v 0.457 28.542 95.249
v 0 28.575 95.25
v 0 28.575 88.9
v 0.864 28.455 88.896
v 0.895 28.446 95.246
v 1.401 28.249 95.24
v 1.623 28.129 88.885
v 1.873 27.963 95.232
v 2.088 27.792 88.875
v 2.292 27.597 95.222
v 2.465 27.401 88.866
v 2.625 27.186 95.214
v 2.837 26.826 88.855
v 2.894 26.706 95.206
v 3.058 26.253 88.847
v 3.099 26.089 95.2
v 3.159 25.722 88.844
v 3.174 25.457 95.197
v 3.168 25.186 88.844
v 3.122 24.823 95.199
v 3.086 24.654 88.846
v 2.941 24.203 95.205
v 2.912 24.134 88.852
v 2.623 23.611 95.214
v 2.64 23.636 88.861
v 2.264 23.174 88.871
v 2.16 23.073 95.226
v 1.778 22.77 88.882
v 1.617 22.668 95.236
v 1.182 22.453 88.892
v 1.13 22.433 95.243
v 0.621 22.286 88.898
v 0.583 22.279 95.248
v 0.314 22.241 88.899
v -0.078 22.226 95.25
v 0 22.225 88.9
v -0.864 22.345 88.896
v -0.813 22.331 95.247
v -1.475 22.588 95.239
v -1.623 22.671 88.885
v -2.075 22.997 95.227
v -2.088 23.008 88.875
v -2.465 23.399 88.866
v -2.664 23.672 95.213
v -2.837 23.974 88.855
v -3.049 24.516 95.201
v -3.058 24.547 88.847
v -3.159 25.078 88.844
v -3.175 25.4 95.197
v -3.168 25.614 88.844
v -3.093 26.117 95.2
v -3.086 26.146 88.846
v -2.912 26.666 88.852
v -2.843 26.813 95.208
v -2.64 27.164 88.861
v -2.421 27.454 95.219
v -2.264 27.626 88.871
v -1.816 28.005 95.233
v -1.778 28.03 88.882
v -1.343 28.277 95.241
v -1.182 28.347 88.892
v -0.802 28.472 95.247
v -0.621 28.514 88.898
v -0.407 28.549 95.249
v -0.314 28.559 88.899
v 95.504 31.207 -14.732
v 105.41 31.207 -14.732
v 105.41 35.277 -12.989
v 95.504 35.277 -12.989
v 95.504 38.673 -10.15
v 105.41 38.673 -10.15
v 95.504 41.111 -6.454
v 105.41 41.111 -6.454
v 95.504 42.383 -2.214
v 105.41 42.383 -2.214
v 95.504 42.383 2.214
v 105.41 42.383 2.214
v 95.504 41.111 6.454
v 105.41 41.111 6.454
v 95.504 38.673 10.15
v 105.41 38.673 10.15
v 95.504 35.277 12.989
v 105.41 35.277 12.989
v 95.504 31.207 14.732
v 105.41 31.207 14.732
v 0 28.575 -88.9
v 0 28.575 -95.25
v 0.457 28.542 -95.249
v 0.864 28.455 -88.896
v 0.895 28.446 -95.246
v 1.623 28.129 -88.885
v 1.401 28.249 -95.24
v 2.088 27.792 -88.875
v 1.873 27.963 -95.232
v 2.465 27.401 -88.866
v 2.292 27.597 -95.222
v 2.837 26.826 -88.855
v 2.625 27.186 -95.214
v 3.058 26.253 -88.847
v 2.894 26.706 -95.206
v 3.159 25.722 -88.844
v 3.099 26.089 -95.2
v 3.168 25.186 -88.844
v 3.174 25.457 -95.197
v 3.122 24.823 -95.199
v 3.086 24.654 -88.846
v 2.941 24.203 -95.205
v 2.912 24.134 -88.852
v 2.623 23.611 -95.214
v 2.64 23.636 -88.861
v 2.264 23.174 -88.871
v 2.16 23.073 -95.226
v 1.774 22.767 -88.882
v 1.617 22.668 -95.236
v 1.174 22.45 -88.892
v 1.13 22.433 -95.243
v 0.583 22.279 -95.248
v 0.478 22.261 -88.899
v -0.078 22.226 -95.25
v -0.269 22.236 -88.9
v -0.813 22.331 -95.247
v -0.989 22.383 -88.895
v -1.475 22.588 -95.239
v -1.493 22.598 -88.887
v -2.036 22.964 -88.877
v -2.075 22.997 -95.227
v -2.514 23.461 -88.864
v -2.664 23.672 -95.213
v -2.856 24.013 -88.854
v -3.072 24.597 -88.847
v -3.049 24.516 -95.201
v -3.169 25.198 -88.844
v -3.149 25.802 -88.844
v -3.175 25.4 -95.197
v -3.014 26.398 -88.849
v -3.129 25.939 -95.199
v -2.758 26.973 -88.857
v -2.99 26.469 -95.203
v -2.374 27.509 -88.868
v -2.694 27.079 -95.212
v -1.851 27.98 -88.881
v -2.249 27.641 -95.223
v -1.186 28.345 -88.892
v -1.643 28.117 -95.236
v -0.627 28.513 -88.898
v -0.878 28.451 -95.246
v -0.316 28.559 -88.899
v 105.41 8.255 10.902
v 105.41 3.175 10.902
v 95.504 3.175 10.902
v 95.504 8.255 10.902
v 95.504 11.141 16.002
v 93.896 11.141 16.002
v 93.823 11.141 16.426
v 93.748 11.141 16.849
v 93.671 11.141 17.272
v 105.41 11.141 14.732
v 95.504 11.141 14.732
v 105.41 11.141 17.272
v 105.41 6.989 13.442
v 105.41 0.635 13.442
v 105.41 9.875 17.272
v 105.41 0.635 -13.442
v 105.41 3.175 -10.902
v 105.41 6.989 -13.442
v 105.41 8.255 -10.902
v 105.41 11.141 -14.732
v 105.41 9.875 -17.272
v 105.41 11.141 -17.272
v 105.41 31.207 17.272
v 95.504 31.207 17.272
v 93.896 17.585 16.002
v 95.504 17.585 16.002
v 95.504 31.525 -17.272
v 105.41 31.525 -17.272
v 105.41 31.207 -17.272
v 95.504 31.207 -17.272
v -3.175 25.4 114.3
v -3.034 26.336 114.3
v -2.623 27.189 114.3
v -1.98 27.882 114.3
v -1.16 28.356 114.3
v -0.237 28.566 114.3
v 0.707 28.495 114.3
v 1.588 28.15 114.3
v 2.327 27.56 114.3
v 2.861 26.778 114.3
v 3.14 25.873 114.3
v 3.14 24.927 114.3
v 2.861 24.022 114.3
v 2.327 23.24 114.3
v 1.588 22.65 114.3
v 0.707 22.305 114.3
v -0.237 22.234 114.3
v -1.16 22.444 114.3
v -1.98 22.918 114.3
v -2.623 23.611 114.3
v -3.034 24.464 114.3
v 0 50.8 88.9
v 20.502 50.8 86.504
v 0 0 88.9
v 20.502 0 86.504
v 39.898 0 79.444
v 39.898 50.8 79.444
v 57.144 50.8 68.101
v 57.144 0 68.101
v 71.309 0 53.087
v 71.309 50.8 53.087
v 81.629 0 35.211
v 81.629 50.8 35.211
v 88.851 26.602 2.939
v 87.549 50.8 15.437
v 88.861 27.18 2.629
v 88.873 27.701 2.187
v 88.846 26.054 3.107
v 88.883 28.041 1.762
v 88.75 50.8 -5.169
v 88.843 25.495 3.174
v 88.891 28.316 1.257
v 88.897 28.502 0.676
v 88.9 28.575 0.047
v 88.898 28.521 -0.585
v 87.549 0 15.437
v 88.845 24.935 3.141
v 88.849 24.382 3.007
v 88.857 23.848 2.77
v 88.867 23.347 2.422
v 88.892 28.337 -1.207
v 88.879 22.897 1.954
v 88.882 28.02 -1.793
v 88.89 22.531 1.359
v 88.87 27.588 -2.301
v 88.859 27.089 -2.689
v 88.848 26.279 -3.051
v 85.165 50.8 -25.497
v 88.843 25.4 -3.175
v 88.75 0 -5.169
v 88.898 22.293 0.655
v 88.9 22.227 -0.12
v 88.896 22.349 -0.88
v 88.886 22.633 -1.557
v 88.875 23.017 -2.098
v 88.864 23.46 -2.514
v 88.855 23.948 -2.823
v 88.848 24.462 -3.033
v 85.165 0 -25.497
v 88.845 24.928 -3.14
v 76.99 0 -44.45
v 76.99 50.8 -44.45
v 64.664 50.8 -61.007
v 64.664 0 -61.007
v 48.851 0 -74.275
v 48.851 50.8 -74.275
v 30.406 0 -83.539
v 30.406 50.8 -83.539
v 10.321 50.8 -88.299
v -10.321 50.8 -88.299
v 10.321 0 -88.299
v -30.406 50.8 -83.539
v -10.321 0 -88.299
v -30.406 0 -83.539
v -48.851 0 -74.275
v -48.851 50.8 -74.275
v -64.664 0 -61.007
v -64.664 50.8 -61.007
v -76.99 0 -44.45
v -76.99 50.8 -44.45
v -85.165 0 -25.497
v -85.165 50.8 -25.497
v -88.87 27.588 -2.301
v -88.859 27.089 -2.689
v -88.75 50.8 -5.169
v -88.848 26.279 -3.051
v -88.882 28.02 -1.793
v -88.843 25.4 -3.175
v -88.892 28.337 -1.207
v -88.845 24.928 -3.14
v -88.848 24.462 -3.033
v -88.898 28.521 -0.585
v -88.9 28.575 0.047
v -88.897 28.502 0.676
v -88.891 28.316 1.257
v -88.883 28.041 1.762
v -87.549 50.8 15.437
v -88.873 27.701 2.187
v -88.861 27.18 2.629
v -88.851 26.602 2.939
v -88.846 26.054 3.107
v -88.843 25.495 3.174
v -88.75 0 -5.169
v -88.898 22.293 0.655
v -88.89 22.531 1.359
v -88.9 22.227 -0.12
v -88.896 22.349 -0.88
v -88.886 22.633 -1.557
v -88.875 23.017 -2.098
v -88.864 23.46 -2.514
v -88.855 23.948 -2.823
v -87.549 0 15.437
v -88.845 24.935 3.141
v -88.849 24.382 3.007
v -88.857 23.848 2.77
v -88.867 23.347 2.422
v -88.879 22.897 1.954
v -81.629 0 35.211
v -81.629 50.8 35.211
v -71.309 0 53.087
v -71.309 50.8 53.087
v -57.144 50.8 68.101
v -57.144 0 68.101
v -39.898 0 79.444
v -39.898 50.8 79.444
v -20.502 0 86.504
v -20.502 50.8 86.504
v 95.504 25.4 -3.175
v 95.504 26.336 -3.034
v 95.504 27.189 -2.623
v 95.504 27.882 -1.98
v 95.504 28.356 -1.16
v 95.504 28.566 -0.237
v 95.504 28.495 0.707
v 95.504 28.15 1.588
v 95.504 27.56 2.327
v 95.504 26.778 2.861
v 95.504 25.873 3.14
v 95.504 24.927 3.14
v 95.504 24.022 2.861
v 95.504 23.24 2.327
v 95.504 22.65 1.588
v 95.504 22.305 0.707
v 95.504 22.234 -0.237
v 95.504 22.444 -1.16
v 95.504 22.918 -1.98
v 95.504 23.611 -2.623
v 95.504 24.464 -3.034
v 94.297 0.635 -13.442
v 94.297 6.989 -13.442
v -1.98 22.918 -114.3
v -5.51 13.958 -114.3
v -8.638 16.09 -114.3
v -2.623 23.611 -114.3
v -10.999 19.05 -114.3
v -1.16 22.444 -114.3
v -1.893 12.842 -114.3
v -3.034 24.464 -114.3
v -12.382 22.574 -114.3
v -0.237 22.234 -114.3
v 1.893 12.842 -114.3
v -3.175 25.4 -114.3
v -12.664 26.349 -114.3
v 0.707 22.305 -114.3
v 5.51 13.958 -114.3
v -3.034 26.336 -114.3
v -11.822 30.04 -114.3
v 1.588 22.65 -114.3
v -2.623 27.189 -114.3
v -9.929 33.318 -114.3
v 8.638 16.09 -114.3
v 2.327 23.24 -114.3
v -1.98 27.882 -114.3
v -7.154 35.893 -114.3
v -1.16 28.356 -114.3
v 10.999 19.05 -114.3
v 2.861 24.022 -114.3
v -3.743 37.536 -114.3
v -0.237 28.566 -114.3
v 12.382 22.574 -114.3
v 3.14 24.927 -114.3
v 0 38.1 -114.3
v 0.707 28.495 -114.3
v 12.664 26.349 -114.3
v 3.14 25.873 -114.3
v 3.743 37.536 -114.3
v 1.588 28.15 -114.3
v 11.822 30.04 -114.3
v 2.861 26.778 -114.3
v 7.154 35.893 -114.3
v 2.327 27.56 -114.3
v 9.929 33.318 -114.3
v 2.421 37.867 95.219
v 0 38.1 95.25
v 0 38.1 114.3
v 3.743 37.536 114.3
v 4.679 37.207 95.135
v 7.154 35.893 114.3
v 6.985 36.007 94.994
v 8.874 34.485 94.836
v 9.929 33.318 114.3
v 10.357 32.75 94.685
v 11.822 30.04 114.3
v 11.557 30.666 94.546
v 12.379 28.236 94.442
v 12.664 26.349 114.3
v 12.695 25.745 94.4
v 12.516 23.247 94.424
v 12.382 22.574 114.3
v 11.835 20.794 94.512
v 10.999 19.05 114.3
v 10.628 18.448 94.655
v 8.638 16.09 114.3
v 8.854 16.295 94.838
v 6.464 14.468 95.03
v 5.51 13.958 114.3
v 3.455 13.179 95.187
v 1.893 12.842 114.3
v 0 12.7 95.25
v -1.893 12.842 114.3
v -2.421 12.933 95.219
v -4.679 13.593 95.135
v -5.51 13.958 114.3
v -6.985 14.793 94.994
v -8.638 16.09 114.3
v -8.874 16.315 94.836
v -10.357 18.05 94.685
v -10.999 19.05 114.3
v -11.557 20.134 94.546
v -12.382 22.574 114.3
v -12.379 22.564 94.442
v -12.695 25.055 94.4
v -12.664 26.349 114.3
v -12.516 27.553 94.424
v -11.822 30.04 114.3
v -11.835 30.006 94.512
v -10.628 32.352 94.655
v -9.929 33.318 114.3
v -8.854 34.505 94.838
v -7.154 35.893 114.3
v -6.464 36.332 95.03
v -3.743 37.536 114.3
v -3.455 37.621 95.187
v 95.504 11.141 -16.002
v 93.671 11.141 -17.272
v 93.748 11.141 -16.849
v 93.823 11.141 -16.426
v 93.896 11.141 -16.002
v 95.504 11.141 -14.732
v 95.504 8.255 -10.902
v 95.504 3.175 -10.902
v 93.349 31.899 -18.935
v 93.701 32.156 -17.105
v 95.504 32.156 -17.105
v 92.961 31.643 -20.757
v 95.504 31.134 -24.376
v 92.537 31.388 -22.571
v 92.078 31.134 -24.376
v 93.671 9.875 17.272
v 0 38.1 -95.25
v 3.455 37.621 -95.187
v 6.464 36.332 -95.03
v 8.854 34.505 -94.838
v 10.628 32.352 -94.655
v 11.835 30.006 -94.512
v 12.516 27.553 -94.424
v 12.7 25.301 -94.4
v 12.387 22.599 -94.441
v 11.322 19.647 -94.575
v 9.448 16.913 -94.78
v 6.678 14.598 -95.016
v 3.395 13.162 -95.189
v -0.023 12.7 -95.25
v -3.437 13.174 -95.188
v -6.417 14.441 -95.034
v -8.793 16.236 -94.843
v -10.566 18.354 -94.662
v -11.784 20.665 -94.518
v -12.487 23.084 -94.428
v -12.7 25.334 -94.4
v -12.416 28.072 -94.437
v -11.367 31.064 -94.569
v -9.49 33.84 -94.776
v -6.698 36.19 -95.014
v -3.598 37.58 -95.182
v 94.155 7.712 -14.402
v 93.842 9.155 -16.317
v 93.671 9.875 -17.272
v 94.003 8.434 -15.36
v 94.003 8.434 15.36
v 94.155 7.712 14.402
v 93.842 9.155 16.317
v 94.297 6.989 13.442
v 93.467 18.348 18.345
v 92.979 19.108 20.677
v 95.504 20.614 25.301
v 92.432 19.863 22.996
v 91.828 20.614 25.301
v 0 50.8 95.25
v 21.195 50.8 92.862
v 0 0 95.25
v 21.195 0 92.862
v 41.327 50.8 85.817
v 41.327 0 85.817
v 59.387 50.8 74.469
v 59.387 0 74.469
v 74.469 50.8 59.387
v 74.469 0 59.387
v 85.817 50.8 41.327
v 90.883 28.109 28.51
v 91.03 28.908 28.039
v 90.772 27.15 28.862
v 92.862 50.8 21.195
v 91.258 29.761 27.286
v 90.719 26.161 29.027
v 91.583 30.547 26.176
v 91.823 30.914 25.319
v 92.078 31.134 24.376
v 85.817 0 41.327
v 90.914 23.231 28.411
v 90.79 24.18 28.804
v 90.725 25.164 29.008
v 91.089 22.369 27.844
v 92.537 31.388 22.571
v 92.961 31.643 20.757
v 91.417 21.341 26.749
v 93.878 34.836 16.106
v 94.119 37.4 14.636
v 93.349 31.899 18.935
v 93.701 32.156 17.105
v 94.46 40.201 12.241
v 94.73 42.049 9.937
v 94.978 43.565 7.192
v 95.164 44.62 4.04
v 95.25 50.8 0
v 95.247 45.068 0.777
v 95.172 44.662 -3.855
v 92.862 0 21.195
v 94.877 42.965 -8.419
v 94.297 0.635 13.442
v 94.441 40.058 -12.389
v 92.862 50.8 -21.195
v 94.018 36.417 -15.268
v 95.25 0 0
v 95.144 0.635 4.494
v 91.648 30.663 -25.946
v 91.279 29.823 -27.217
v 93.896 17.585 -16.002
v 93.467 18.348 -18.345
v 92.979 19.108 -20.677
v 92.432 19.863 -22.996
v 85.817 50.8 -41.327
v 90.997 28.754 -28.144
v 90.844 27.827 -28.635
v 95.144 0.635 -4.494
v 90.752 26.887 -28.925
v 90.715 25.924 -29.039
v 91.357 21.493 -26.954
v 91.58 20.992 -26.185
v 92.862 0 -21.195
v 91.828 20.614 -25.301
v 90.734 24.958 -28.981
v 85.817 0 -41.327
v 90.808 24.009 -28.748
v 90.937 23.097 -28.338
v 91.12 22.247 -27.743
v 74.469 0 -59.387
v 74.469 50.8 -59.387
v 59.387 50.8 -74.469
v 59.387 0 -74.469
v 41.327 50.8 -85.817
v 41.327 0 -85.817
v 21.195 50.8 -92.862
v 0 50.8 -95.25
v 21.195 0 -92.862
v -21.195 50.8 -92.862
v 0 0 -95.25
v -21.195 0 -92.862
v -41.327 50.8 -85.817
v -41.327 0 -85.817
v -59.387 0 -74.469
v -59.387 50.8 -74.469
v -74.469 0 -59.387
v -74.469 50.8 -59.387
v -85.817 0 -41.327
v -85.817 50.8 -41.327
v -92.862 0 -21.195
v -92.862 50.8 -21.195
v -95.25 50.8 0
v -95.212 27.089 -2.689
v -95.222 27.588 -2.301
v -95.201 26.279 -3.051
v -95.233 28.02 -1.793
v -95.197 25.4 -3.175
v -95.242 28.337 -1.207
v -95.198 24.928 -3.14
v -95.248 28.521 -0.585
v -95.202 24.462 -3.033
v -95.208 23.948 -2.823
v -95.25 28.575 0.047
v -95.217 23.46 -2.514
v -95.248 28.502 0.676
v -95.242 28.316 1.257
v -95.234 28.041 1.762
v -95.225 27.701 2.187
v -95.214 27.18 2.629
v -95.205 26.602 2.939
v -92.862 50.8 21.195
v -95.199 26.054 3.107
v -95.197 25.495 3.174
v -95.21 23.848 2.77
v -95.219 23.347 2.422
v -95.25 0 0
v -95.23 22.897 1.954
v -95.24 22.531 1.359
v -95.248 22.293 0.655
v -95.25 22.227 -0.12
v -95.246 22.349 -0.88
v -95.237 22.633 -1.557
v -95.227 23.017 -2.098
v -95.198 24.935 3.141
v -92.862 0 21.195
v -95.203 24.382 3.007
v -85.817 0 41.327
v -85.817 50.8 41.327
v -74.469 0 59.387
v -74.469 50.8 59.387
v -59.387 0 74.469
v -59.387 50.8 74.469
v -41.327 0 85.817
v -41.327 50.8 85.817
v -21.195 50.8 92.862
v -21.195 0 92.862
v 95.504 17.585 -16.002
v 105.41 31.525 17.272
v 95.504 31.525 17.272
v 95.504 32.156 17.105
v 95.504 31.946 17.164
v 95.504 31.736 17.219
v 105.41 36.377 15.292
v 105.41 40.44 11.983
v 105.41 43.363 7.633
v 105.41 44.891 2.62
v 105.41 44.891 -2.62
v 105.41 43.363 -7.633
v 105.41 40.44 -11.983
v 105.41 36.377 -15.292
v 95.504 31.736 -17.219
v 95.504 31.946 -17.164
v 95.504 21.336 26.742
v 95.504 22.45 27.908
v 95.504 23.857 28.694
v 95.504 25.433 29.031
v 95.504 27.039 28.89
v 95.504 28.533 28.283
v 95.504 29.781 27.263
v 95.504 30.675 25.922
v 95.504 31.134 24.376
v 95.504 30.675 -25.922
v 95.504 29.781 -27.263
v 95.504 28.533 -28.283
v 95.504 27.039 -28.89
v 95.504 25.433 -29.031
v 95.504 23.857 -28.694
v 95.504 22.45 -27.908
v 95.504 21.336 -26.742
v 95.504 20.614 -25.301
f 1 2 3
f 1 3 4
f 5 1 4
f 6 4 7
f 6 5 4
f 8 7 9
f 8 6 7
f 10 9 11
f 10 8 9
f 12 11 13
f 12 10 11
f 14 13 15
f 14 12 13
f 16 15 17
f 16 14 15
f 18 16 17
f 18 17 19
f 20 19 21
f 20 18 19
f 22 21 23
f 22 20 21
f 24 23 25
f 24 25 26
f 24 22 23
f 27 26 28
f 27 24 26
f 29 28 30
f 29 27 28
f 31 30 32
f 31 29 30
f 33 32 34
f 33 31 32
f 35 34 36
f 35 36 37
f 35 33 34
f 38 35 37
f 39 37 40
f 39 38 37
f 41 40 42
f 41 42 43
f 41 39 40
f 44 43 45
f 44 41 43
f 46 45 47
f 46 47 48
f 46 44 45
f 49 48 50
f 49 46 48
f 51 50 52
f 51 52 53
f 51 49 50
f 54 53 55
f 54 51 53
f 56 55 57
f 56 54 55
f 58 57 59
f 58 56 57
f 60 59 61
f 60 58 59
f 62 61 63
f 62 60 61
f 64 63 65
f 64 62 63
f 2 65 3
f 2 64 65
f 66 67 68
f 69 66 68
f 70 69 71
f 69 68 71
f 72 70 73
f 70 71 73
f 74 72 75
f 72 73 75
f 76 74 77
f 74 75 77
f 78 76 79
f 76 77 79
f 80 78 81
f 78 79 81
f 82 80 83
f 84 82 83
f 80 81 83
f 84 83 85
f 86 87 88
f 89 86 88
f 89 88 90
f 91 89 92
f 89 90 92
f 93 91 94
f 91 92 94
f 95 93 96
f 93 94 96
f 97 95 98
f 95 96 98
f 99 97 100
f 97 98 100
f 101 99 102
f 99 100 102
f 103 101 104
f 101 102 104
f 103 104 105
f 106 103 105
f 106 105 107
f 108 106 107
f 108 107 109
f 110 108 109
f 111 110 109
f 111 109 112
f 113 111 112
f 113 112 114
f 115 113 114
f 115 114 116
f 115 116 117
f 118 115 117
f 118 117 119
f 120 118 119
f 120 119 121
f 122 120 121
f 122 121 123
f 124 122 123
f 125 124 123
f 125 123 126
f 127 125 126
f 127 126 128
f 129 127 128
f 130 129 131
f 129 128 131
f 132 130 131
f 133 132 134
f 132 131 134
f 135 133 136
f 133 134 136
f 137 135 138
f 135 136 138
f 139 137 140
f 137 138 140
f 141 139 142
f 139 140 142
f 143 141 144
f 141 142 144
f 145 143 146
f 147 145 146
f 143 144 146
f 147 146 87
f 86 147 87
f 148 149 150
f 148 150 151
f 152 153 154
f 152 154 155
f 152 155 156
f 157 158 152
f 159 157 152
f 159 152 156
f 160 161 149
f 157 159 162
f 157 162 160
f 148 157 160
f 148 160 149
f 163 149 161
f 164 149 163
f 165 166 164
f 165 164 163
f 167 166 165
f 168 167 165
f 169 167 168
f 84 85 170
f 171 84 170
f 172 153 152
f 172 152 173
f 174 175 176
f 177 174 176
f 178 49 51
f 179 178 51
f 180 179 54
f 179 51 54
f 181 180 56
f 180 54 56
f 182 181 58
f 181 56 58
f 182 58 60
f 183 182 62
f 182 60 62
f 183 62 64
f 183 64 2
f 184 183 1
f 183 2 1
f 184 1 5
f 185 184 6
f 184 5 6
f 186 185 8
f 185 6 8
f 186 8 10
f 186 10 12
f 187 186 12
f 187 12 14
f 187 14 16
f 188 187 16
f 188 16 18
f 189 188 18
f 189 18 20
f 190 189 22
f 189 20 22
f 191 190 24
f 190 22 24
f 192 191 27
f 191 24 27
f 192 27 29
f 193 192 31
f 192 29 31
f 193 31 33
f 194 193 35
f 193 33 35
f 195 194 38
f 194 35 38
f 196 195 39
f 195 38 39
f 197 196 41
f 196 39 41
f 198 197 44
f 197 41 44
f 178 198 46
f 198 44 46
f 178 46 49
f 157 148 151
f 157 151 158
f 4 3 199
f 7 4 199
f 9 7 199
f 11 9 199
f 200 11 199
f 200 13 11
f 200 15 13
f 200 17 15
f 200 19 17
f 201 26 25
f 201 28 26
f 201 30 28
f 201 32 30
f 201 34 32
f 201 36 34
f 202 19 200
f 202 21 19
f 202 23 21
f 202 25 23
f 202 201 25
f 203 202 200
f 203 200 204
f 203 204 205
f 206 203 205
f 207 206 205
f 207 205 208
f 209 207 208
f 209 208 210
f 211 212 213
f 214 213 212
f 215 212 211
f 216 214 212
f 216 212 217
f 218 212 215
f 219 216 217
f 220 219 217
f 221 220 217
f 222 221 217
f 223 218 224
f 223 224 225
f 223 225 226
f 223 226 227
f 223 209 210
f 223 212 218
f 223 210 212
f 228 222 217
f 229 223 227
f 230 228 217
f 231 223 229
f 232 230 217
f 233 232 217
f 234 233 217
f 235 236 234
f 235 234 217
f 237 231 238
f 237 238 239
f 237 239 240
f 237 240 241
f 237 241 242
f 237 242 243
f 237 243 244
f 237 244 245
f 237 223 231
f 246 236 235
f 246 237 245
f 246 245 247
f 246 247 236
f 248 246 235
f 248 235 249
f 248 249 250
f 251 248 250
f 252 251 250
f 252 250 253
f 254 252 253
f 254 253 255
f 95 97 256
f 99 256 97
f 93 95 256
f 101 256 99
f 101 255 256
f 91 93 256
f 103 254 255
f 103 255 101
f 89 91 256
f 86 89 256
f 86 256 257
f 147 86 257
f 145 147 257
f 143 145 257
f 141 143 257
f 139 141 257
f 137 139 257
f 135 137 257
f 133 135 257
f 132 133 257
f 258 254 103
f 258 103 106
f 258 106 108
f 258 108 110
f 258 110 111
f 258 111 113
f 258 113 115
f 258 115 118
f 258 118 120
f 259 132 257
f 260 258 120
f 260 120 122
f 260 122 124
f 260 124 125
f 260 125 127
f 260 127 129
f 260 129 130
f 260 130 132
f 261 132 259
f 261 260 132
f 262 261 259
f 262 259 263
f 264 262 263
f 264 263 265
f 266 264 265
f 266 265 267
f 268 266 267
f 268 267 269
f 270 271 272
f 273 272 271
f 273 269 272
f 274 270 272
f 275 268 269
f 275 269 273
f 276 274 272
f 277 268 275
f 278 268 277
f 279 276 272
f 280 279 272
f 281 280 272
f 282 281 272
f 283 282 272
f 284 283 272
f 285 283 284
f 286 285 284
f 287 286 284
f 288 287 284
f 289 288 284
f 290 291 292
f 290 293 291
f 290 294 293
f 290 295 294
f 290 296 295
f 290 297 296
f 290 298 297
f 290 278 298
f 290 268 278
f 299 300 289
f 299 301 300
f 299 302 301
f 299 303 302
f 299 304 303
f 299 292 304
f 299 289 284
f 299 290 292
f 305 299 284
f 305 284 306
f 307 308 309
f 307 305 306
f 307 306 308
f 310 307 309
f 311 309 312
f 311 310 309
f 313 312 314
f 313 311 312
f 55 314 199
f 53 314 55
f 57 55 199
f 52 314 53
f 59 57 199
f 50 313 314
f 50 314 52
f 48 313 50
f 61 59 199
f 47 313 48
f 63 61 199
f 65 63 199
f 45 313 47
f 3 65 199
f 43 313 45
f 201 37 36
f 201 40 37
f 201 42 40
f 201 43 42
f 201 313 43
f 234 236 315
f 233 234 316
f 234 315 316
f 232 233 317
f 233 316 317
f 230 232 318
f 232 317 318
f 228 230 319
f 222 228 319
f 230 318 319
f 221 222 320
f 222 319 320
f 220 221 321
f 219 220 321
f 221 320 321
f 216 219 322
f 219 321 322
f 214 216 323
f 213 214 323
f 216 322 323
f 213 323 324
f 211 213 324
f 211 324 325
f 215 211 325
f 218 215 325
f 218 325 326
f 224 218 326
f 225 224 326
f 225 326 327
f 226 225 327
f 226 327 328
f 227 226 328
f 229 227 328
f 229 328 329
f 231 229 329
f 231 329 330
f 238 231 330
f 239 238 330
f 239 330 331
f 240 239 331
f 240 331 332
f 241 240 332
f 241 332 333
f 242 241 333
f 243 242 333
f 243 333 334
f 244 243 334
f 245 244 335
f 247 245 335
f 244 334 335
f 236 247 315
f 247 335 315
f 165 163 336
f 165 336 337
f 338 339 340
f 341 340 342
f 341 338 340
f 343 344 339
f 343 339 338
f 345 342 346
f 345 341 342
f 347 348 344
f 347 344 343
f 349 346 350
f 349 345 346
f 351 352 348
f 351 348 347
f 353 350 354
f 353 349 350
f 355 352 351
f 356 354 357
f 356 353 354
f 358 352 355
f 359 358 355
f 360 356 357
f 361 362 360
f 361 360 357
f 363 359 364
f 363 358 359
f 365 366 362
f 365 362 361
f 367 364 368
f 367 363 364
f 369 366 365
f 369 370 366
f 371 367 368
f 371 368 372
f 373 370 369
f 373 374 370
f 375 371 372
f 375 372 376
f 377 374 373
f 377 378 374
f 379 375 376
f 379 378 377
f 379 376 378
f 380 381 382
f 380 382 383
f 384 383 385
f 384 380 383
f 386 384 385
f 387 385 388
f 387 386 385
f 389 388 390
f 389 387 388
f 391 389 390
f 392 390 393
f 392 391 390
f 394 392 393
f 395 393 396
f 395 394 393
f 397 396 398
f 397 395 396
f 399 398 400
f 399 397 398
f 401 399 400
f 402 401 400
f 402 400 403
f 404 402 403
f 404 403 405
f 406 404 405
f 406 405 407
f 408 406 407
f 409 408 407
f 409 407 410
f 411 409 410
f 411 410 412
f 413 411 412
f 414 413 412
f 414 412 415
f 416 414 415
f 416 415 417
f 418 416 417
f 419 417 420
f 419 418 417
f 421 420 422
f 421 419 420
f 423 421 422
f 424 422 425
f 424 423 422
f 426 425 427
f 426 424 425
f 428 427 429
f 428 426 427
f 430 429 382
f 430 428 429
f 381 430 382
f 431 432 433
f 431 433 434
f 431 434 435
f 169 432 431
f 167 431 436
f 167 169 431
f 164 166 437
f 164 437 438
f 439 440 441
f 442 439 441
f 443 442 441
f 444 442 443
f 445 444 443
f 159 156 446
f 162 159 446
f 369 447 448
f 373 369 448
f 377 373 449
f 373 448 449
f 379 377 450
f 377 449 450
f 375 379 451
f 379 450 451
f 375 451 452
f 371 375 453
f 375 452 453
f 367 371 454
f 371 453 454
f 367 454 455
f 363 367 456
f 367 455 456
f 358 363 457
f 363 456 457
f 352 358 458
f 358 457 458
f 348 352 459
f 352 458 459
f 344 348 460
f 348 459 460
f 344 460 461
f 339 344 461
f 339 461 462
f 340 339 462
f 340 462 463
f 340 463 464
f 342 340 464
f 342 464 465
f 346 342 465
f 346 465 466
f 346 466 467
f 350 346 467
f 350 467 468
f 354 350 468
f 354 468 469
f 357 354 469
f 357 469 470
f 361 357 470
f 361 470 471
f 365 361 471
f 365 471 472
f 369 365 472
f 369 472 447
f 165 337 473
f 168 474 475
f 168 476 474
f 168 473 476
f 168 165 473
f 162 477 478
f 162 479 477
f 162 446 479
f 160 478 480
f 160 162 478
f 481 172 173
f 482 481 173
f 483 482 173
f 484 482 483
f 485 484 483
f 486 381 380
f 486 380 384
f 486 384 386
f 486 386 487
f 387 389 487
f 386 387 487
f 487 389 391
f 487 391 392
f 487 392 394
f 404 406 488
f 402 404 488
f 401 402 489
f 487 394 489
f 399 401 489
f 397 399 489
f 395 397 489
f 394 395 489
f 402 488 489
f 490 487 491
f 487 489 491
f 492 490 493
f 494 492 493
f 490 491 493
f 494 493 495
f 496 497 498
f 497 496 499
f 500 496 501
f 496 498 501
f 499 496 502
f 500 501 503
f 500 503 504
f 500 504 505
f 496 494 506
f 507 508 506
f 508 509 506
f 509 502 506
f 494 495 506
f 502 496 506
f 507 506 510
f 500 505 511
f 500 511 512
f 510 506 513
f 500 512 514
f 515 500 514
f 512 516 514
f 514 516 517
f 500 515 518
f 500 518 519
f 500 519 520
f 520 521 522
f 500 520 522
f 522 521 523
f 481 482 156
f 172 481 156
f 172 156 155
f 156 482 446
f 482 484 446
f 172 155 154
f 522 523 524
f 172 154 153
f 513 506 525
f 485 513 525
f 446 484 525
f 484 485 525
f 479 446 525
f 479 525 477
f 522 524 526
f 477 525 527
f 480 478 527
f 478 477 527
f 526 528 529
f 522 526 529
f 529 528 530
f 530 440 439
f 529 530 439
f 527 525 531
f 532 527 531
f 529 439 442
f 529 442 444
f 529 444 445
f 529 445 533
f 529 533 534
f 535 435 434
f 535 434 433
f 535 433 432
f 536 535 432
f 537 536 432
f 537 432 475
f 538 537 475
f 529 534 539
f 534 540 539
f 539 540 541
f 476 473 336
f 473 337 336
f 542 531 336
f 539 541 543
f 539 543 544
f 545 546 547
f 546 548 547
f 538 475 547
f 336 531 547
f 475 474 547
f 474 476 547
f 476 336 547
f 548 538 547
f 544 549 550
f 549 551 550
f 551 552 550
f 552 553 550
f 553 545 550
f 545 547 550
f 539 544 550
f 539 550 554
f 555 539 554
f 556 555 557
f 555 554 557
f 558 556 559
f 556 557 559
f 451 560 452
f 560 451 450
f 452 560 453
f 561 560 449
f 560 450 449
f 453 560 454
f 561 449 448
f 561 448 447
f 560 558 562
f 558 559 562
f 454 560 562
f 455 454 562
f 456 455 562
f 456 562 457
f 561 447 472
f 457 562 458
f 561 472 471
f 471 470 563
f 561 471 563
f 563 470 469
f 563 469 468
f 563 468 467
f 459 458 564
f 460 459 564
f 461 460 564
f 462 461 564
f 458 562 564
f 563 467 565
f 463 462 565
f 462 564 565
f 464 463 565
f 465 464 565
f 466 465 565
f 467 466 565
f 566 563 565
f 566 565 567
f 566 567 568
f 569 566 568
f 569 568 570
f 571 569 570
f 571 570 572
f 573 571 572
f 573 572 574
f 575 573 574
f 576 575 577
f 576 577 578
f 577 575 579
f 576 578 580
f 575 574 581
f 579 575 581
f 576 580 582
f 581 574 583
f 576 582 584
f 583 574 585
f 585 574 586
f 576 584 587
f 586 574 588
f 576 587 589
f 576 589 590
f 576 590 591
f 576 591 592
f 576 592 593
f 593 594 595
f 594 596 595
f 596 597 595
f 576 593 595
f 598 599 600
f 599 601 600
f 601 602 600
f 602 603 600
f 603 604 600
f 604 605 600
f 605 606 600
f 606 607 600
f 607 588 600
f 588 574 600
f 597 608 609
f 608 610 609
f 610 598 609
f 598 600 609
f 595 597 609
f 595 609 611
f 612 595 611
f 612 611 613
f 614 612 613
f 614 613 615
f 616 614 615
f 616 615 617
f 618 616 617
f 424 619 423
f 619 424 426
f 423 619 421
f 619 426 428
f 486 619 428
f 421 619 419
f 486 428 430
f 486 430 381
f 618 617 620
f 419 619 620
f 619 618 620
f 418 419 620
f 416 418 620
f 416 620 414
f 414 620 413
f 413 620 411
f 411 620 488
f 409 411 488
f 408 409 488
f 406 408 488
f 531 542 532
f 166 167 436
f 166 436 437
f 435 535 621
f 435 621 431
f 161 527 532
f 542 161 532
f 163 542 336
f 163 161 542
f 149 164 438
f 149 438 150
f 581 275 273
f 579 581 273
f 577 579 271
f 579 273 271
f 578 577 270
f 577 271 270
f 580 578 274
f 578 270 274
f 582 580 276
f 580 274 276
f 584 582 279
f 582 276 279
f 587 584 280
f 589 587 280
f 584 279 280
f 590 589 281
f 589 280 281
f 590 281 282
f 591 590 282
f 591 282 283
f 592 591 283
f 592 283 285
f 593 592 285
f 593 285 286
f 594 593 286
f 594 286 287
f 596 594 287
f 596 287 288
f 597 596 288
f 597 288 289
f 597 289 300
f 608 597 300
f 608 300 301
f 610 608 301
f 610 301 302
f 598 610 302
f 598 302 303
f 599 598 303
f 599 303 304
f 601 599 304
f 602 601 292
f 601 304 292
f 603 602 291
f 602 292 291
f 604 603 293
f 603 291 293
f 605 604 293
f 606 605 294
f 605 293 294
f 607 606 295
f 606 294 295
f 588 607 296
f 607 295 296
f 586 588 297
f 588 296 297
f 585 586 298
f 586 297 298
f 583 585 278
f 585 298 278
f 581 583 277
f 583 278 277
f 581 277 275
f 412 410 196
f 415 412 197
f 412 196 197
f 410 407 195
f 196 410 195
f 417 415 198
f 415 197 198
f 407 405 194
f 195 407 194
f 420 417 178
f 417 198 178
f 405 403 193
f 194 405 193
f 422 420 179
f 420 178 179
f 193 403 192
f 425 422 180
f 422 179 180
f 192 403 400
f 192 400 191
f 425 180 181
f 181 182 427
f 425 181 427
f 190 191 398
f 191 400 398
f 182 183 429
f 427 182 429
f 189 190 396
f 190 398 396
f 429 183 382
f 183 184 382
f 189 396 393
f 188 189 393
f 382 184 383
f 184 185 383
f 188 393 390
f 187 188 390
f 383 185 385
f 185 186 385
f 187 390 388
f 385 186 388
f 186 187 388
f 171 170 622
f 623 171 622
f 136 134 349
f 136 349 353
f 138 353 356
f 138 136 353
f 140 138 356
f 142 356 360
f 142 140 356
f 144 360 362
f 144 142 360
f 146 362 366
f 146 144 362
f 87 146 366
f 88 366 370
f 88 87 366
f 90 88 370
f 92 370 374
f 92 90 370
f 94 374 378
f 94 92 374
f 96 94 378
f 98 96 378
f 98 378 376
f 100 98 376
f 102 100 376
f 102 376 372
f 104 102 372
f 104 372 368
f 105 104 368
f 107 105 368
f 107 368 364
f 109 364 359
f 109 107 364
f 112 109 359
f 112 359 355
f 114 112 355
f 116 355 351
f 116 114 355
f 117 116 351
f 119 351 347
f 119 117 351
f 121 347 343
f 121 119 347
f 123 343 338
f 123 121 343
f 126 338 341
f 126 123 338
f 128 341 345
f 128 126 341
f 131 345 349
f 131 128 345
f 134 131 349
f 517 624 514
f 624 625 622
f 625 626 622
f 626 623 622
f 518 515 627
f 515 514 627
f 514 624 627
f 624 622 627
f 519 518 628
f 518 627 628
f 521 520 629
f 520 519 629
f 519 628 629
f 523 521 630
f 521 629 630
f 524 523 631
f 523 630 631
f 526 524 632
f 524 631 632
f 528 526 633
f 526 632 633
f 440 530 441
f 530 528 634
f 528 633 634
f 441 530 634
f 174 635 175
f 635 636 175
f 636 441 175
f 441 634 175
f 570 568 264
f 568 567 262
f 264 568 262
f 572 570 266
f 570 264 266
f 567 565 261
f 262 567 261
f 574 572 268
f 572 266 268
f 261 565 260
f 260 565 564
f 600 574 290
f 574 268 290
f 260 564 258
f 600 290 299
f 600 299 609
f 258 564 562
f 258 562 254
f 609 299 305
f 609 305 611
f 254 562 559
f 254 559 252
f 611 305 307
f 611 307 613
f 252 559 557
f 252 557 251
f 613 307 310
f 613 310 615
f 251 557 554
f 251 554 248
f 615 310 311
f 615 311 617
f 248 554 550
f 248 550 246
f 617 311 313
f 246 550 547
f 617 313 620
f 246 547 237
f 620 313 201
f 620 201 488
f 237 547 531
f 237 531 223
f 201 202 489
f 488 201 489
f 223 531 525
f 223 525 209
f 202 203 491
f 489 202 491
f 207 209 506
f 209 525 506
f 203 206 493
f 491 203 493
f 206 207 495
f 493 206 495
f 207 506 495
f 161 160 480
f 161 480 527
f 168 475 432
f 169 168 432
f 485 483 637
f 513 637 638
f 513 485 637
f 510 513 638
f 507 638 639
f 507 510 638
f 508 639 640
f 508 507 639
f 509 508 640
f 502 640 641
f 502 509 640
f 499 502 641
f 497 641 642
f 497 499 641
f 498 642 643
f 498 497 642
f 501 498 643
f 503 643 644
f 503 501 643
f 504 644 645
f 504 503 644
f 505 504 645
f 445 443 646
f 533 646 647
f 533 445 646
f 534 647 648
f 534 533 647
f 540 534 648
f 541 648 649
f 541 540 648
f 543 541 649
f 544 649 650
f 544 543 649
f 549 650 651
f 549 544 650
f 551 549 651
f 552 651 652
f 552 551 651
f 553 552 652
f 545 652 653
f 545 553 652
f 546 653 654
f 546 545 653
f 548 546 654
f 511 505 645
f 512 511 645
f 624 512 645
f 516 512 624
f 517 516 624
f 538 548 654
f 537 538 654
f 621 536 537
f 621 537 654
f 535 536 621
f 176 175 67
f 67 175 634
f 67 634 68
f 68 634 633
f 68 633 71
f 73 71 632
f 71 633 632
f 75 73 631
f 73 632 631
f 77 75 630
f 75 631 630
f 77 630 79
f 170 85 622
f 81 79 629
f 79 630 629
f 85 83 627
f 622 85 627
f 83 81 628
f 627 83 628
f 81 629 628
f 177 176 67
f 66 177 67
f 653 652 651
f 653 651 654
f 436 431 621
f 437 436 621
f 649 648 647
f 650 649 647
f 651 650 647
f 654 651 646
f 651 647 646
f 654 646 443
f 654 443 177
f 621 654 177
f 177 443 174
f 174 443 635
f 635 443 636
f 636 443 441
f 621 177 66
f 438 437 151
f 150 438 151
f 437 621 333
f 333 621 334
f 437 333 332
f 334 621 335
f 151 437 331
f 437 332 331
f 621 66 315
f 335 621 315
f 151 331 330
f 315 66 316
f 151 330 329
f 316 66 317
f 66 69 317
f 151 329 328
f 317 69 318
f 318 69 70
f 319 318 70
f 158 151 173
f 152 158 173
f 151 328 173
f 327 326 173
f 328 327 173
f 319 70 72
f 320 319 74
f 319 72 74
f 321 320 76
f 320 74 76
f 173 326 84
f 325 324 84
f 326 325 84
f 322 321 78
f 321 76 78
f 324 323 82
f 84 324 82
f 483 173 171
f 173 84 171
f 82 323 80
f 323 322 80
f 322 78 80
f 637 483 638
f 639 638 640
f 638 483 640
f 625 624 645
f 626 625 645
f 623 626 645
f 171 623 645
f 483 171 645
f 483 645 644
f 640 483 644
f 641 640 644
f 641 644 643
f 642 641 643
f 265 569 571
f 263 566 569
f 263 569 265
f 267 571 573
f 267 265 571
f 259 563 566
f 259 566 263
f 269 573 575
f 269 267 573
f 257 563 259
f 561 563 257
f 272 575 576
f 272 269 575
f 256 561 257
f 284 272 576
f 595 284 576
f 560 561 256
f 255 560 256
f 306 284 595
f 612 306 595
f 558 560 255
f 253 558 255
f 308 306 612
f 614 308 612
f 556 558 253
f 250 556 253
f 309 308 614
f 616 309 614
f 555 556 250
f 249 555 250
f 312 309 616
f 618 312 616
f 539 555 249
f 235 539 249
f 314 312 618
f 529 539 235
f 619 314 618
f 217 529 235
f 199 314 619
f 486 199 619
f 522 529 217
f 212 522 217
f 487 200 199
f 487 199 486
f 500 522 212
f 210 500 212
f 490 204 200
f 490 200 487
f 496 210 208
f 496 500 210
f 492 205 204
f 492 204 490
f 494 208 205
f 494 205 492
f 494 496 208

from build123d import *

# Parameters (mm, degrees)
SKETCH1_R                            = 95.25
SKETCH1_R_2                          = 88.9
BOSS_EXTRUDE1_DEPTH                  = 50.8
SKETCH4_R                            = 3.175
CUT_EXTRUDE2_DEPTH                   = 10.16
BOSS_EXTRUDE3_DEPTH                  = 10.16
BOSS_EXTRUDE3_DIRECTION_2_REACH      = 220.96
BOSS_EXTRUDE3_DIRECTION_2_END_RADIUS = 95.25
BOSS_EXTRUDE9_REACH                  = 220.96
BOSS_EXTRUDE9_END_RADIUS             = 95.25
BOSS_EXTRUDE9_DIRECTION_2_DEPTH      = 0.254
SKETCH7_R                            = 3.175
CUT_EXTRUDE3_DEPTH                   = 220.180955111
BOSS_EXTRUDE10_START                 = -0.850464
SKETCH8_R                            = 12.7
SKETCH8_R_2                          = 3.175
BOSS_EXTRUDE10_DEPTH                 = 19.900464


with BuildPart() as part:
    # Sketch1 → Boss-Extrude1 (new body)
    with BuildSketch(Plane(origin=(0, 0, 0), x_dir=(1, 0, 0), z_dir=(0, 1, 0))):
        with Locations(Location((0, 0, 0), (0, 0, 270))):
            Circle(SKETCH1_R)
        with Locations(Location((0, 0, 0), (0, 0, 270))):
            Circle(SKETCH1_R_2, mode=Mode.SUBTRACT)
    extrude(amount=BOSS_EXTRUDE1_DEPTH)

    # Sketch4 → Cut-Extrude2 (cut)
    with BuildSketch(Plane(origin=(0, 0, -95.25), x_dir=(-1, 0, 0), z_dir=(0, 0, -1))):
        with Locations(Location((0, 25.4, 0), (0, 0, 90))):
            Circle(SKETCH4_R)
    cut_extrude2 = extrude(amount=-CUT_EXTRUDE2_DEPTH, mode=Mode.SUBTRACT)

    # Mirror2: Cut-Extrude2 across plane
    add(cut_extrude2.mirror(Plane.XY), mode=Mode.SUBTRACT)

    # Sketch5 → Boss-Extrude3 (add)
    with BuildSketch(Plane(origin=(95.25, 0, 0), x_dir=(0, 0, -1), z_dir=(1, 0, 0))):
        Polygon((14.732, 11.14102204), (10.902119397, 8.255), (10.902119397, 3.175), (-10.902119397, 3.175), (-10.902119397, 8.255), (-14.732, 11.14102204), (-17.272, 11.14102204), (-17.272, 9.874624755), (-13.442119397, 6.988602716), (-13.442119397, 0.635), (13.442119397, 0.635), (13.442119397, 6.988602716), (17.272, 9.874624755), (17.272, 11.14102204), align=None)
        with BuildLine():
            Line((17.272, 31.524764922), (17.272, 31.20702204))
            Line((17.272, 31.20702204), (14.732, 31.20702204))
            ThreePointArc((14.732, 31.20702204), (0, 42.545), (-14.732, 31.20702204))
            Line((-14.732, 31.20702204), (-17.272, 31.20702204))
            Line((-17.272, 31.20702204), (-17.272, 31.524764922))
            ThreePointArc((-17.272, 31.524764922), (0, 45.085), (17.272, 31.524764922))
        make_face()
    extrude(amount=BOSS_EXTRUDE3_DEPTH)

    # Boss-Extrude3 direction 2: up to this cylinder (the profile starts outside it)
    boss_extrude3_direction_2_end = Plane(origin=(0, 20.387773, 0), z_dir=(0, -1, 0)) * Cylinder(BOSS_EXTRUDE3_DIRECTION_2_END_RADIUS, 655.37624, mode=Mode.PRIVATE)
    # Sketch5 → Boss-Extrude3 direction 2 (add, up to the surface)
    with BuildSketch(Plane(origin=(95.25, 0, 0), x_dir=(0, 0, -1), z_dir=(1, 0, 0)), mode=Mode.PRIVATE) as boss_extrude3_direction_2_sk1:
        Polygon((14.732, 11.14102204), (10.902119397, 8.255), (10.902119397, 3.175), (-10.902119397, 3.175), (-10.902119397, 8.255), (-14.732, 11.14102204), (-17.272, 11.14102204), (-17.272, 9.874624755), (-13.442119397, 6.988602716), (-13.442119397, 0.635), (13.442119397, 0.635), (13.442119397, 6.988602716), (17.272, 9.874624755), (17.272, 11.14102204), align=None)
    boss_extrude3_direction_2_tool1 = extrude(boss_extrude3_direction_2_sk1.sketch, amount=-BOSS_EXTRUDE3_DIRECTION_2_REACH, mode=Mode.PRIVATE) - boss_extrude3_direction_2_end
    add(boss_extrude3_direction_2_tool1.solids().sort_by_distance((95.25, 9.409653, -13.034353))[0])
    add(boss_extrude3_direction_2_tool1.solids().sort_by_distance((95.25, 9.409653, -13.034353))[1])
    # Sketch5 → Boss-Extrude3 direction 2 (add, up to the surface)
    with BuildSketch(Plane(origin=(95.25, 0, 0), x_dir=(0, 0, -1), z_dir=(1, 0, 0)), mode=Mode.PRIVATE) as boss_extrude3_direction_2_sk2:
        with BuildLine():
            Line((17.272, 31.524764922), (17.272, 31.20702204))
            Line((17.272, 31.20702204), (14.732, 31.20702204))
            ThreePointArc((14.732, 31.20702204), (0, 42.545), (-14.732, 31.20702204))
            Line((-14.732, 31.20702204), (-17.272, 31.20702204))
            Line((-17.272, 31.20702204), (-17.272, 31.524764922))
            ThreePointArc((-17.272, 31.524764922), (0, 45.085), (17.272, 31.524764922))
        make_face()
    boss_extrude3_direction_2_tool2 = extrude(boss_extrude3_direction_2_sk2.sketch, amount=-BOSS_EXTRUDE3_DIRECTION_2_REACH, mode=Mode.PRIVATE) - boss_extrude3_direction_2_end
    add(boss_extrude3_direction_2_tool2.solids().sort_by_distance((95.25, 31.365893, -16.899725))[0])
    add(boss_extrude3_direction_2_tool2.solids().sort_by_distance((95.25, 31.365893, -16.899725))[1])

    # Boss-Extrude9: up to this cylinder (the profile starts outside it)
    boss_extrude9_end = Plane(origin=(0, 22.775292, 0), z_dir=(0, -1, 0)) * Cylinder(BOSS_EXTRUDE9_END_RADIUS, 633.42, mode=Mode.PRIVATE)
    # Sketch6 → Boss-Extrude9 (add, up to the surface)
    with BuildSketch(Plane(origin=(95.25, 0, 0), x_dir=(0, 0, -1), z_dir=(1, 0, 0)), mode=Mode.PRIVATE) as boss_extrude9_sk1:
        with BuildLine():
            Line((15.720104226, 32.350634064), (24.376259803, 31.134090734))
            ThreePointArc((24.376259803, 31.134090734), (29.020776957, 26.241656743), (25.300667362, 20.614203096))
            Line((25.300667362, 20.614203096), (16.002, 17.585051702))
            Line((16.002, 17.585051702), (16.002, 10.507823398))
            Line((16.002, 10.507823398), (12.172119397, 7.621801358))
            Line((12.172119397, 7.621801358), (12.172119397, 1.905))
            Line((12.172119397, 1.905), (-12.172119397, 1.905))
            Line((-12.172119397, 1.905), (-12.172119397, 7.621801358))
            Line((-12.172119397, 7.621801358), (-16.002, 10.507823398))
            Line((-16.002, 10.507823398), (-16.002, 17.585051702))
            Line((-16.002, 17.585051702), (-25.300667362, 20.614203096))
            ThreePointArc((-25.300667362, 20.614203096), (-29.020776957, 26.241656743), (-24.376259803, 31.134090734))
            Line((-24.376259803, 31.134090734), (-15.720104226, 32.350634064))
            ThreePointArc((-15.720104226, 32.350634064), (0, 43.815), (15.720104226, 32.350634064))
        make_face()
    boss_extrude9_tool1 = extrude(boss_extrude9_sk1.sketch, amount=-BOSS_EXTRUDE9_REACH, mode=Mode.PRIVATE) - boss_extrude9_end
    add(boss_extrude9_tool1.solids().sort_by_distance((95.25, 22.775292, 0))[0])
    add(boss_extrude9_tool1.solids().sort_by_distance((95.25, 22.775292, 0))[1])

    # Sketch6 → Boss-Extrude9 direction 2 (add)
    with BuildSketch(Plane(origin=(95.25, 0, 0), x_dir=(0, 0, -1), z_dir=(1, 0, 0))):
        with BuildLine():
            Line((15.720104226, 32.350634064), (24.376259803, 31.134090734))
            ThreePointArc((24.376259803, 31.134090734), (29.020776957, 26.241656743), (25.300667362, 20.614203096))
            Line((25.300667362, 20.614203096), (16.002, 17.585051702))
            Line((16.002, 17.585051702), (16.002, 10.507823398))
            Line((16.002, 10.507823398), (12.172119397, 7.621801358))
            Line((12.172119397, 7.621801358), (12.172119397, 1.905))
            Line((12.172119397, 1.905), (-12.172119397, 1.905))
            Line((-12.172119397, 1.905), (-12.172119397, 7.621801358))
            Line((-12.172119397, 7.621801358), (-16.002, 10.507823398))
            Line((-16.002, 10.507823398), (-16.002, 17.585051702))
            Line((-16.002, 17.585051702), (-25.300667362, 20.614203096))
            ThreePointArc((-25.300667362, 20.614203096), (-29.020776957, 26.241656743), (-24.376259803, 31.134090734))
            Line((-24.376259803, 31.134090734), (-15.720104226, 32.350634064))
            ThreePointArc((-15.720104226, 32.350634064), (0, 43.815), (15.720104226, 32.350634064))
        make_face()
    extrude(amount=BOSS_EXTRUDE9_DIRECTION_2_DEPTH)

    # Sketch7 → Cut-Extrude3 (cut, through all)
    with BuildSketch(Plane(origin=(95.504, 0, 0), x_dir=(0, 0, -1), z_dir=(1, 0, 0))):
        with Locations((0, 25.4)):
            Circle(SKETCH7_R)
    extrude(amount=-CUT_EXTRUDE3_DEPTH, mode=Mode.SUBTRACT)

    # Sketch8 → Boss-Extrude10 (add)
    with BuildSketch(Plane(origin=(0, 0, -95.25), x_dir=(-1, 0, 0), z_dir=(0, 0, -1)).offset(BOSS_EXTRUDE10_START)):
        with Locations(Location((0, 25.4, 0), (0, 0, 90))):
            Circle(SKETCH8_R)
        with Locations((0, 25.4)):
            Circle(SKETCH8_R_2, mode=Mode.SUBTRACT)
    boss_extrude10 = extrude(amount=BOSS_EXTRUDE10_DEPTH)

    # Mirror3: Boss-Extrude10 across plane
    add(boss_extrude10.mirror(Plane.XY))


solid = part.part
